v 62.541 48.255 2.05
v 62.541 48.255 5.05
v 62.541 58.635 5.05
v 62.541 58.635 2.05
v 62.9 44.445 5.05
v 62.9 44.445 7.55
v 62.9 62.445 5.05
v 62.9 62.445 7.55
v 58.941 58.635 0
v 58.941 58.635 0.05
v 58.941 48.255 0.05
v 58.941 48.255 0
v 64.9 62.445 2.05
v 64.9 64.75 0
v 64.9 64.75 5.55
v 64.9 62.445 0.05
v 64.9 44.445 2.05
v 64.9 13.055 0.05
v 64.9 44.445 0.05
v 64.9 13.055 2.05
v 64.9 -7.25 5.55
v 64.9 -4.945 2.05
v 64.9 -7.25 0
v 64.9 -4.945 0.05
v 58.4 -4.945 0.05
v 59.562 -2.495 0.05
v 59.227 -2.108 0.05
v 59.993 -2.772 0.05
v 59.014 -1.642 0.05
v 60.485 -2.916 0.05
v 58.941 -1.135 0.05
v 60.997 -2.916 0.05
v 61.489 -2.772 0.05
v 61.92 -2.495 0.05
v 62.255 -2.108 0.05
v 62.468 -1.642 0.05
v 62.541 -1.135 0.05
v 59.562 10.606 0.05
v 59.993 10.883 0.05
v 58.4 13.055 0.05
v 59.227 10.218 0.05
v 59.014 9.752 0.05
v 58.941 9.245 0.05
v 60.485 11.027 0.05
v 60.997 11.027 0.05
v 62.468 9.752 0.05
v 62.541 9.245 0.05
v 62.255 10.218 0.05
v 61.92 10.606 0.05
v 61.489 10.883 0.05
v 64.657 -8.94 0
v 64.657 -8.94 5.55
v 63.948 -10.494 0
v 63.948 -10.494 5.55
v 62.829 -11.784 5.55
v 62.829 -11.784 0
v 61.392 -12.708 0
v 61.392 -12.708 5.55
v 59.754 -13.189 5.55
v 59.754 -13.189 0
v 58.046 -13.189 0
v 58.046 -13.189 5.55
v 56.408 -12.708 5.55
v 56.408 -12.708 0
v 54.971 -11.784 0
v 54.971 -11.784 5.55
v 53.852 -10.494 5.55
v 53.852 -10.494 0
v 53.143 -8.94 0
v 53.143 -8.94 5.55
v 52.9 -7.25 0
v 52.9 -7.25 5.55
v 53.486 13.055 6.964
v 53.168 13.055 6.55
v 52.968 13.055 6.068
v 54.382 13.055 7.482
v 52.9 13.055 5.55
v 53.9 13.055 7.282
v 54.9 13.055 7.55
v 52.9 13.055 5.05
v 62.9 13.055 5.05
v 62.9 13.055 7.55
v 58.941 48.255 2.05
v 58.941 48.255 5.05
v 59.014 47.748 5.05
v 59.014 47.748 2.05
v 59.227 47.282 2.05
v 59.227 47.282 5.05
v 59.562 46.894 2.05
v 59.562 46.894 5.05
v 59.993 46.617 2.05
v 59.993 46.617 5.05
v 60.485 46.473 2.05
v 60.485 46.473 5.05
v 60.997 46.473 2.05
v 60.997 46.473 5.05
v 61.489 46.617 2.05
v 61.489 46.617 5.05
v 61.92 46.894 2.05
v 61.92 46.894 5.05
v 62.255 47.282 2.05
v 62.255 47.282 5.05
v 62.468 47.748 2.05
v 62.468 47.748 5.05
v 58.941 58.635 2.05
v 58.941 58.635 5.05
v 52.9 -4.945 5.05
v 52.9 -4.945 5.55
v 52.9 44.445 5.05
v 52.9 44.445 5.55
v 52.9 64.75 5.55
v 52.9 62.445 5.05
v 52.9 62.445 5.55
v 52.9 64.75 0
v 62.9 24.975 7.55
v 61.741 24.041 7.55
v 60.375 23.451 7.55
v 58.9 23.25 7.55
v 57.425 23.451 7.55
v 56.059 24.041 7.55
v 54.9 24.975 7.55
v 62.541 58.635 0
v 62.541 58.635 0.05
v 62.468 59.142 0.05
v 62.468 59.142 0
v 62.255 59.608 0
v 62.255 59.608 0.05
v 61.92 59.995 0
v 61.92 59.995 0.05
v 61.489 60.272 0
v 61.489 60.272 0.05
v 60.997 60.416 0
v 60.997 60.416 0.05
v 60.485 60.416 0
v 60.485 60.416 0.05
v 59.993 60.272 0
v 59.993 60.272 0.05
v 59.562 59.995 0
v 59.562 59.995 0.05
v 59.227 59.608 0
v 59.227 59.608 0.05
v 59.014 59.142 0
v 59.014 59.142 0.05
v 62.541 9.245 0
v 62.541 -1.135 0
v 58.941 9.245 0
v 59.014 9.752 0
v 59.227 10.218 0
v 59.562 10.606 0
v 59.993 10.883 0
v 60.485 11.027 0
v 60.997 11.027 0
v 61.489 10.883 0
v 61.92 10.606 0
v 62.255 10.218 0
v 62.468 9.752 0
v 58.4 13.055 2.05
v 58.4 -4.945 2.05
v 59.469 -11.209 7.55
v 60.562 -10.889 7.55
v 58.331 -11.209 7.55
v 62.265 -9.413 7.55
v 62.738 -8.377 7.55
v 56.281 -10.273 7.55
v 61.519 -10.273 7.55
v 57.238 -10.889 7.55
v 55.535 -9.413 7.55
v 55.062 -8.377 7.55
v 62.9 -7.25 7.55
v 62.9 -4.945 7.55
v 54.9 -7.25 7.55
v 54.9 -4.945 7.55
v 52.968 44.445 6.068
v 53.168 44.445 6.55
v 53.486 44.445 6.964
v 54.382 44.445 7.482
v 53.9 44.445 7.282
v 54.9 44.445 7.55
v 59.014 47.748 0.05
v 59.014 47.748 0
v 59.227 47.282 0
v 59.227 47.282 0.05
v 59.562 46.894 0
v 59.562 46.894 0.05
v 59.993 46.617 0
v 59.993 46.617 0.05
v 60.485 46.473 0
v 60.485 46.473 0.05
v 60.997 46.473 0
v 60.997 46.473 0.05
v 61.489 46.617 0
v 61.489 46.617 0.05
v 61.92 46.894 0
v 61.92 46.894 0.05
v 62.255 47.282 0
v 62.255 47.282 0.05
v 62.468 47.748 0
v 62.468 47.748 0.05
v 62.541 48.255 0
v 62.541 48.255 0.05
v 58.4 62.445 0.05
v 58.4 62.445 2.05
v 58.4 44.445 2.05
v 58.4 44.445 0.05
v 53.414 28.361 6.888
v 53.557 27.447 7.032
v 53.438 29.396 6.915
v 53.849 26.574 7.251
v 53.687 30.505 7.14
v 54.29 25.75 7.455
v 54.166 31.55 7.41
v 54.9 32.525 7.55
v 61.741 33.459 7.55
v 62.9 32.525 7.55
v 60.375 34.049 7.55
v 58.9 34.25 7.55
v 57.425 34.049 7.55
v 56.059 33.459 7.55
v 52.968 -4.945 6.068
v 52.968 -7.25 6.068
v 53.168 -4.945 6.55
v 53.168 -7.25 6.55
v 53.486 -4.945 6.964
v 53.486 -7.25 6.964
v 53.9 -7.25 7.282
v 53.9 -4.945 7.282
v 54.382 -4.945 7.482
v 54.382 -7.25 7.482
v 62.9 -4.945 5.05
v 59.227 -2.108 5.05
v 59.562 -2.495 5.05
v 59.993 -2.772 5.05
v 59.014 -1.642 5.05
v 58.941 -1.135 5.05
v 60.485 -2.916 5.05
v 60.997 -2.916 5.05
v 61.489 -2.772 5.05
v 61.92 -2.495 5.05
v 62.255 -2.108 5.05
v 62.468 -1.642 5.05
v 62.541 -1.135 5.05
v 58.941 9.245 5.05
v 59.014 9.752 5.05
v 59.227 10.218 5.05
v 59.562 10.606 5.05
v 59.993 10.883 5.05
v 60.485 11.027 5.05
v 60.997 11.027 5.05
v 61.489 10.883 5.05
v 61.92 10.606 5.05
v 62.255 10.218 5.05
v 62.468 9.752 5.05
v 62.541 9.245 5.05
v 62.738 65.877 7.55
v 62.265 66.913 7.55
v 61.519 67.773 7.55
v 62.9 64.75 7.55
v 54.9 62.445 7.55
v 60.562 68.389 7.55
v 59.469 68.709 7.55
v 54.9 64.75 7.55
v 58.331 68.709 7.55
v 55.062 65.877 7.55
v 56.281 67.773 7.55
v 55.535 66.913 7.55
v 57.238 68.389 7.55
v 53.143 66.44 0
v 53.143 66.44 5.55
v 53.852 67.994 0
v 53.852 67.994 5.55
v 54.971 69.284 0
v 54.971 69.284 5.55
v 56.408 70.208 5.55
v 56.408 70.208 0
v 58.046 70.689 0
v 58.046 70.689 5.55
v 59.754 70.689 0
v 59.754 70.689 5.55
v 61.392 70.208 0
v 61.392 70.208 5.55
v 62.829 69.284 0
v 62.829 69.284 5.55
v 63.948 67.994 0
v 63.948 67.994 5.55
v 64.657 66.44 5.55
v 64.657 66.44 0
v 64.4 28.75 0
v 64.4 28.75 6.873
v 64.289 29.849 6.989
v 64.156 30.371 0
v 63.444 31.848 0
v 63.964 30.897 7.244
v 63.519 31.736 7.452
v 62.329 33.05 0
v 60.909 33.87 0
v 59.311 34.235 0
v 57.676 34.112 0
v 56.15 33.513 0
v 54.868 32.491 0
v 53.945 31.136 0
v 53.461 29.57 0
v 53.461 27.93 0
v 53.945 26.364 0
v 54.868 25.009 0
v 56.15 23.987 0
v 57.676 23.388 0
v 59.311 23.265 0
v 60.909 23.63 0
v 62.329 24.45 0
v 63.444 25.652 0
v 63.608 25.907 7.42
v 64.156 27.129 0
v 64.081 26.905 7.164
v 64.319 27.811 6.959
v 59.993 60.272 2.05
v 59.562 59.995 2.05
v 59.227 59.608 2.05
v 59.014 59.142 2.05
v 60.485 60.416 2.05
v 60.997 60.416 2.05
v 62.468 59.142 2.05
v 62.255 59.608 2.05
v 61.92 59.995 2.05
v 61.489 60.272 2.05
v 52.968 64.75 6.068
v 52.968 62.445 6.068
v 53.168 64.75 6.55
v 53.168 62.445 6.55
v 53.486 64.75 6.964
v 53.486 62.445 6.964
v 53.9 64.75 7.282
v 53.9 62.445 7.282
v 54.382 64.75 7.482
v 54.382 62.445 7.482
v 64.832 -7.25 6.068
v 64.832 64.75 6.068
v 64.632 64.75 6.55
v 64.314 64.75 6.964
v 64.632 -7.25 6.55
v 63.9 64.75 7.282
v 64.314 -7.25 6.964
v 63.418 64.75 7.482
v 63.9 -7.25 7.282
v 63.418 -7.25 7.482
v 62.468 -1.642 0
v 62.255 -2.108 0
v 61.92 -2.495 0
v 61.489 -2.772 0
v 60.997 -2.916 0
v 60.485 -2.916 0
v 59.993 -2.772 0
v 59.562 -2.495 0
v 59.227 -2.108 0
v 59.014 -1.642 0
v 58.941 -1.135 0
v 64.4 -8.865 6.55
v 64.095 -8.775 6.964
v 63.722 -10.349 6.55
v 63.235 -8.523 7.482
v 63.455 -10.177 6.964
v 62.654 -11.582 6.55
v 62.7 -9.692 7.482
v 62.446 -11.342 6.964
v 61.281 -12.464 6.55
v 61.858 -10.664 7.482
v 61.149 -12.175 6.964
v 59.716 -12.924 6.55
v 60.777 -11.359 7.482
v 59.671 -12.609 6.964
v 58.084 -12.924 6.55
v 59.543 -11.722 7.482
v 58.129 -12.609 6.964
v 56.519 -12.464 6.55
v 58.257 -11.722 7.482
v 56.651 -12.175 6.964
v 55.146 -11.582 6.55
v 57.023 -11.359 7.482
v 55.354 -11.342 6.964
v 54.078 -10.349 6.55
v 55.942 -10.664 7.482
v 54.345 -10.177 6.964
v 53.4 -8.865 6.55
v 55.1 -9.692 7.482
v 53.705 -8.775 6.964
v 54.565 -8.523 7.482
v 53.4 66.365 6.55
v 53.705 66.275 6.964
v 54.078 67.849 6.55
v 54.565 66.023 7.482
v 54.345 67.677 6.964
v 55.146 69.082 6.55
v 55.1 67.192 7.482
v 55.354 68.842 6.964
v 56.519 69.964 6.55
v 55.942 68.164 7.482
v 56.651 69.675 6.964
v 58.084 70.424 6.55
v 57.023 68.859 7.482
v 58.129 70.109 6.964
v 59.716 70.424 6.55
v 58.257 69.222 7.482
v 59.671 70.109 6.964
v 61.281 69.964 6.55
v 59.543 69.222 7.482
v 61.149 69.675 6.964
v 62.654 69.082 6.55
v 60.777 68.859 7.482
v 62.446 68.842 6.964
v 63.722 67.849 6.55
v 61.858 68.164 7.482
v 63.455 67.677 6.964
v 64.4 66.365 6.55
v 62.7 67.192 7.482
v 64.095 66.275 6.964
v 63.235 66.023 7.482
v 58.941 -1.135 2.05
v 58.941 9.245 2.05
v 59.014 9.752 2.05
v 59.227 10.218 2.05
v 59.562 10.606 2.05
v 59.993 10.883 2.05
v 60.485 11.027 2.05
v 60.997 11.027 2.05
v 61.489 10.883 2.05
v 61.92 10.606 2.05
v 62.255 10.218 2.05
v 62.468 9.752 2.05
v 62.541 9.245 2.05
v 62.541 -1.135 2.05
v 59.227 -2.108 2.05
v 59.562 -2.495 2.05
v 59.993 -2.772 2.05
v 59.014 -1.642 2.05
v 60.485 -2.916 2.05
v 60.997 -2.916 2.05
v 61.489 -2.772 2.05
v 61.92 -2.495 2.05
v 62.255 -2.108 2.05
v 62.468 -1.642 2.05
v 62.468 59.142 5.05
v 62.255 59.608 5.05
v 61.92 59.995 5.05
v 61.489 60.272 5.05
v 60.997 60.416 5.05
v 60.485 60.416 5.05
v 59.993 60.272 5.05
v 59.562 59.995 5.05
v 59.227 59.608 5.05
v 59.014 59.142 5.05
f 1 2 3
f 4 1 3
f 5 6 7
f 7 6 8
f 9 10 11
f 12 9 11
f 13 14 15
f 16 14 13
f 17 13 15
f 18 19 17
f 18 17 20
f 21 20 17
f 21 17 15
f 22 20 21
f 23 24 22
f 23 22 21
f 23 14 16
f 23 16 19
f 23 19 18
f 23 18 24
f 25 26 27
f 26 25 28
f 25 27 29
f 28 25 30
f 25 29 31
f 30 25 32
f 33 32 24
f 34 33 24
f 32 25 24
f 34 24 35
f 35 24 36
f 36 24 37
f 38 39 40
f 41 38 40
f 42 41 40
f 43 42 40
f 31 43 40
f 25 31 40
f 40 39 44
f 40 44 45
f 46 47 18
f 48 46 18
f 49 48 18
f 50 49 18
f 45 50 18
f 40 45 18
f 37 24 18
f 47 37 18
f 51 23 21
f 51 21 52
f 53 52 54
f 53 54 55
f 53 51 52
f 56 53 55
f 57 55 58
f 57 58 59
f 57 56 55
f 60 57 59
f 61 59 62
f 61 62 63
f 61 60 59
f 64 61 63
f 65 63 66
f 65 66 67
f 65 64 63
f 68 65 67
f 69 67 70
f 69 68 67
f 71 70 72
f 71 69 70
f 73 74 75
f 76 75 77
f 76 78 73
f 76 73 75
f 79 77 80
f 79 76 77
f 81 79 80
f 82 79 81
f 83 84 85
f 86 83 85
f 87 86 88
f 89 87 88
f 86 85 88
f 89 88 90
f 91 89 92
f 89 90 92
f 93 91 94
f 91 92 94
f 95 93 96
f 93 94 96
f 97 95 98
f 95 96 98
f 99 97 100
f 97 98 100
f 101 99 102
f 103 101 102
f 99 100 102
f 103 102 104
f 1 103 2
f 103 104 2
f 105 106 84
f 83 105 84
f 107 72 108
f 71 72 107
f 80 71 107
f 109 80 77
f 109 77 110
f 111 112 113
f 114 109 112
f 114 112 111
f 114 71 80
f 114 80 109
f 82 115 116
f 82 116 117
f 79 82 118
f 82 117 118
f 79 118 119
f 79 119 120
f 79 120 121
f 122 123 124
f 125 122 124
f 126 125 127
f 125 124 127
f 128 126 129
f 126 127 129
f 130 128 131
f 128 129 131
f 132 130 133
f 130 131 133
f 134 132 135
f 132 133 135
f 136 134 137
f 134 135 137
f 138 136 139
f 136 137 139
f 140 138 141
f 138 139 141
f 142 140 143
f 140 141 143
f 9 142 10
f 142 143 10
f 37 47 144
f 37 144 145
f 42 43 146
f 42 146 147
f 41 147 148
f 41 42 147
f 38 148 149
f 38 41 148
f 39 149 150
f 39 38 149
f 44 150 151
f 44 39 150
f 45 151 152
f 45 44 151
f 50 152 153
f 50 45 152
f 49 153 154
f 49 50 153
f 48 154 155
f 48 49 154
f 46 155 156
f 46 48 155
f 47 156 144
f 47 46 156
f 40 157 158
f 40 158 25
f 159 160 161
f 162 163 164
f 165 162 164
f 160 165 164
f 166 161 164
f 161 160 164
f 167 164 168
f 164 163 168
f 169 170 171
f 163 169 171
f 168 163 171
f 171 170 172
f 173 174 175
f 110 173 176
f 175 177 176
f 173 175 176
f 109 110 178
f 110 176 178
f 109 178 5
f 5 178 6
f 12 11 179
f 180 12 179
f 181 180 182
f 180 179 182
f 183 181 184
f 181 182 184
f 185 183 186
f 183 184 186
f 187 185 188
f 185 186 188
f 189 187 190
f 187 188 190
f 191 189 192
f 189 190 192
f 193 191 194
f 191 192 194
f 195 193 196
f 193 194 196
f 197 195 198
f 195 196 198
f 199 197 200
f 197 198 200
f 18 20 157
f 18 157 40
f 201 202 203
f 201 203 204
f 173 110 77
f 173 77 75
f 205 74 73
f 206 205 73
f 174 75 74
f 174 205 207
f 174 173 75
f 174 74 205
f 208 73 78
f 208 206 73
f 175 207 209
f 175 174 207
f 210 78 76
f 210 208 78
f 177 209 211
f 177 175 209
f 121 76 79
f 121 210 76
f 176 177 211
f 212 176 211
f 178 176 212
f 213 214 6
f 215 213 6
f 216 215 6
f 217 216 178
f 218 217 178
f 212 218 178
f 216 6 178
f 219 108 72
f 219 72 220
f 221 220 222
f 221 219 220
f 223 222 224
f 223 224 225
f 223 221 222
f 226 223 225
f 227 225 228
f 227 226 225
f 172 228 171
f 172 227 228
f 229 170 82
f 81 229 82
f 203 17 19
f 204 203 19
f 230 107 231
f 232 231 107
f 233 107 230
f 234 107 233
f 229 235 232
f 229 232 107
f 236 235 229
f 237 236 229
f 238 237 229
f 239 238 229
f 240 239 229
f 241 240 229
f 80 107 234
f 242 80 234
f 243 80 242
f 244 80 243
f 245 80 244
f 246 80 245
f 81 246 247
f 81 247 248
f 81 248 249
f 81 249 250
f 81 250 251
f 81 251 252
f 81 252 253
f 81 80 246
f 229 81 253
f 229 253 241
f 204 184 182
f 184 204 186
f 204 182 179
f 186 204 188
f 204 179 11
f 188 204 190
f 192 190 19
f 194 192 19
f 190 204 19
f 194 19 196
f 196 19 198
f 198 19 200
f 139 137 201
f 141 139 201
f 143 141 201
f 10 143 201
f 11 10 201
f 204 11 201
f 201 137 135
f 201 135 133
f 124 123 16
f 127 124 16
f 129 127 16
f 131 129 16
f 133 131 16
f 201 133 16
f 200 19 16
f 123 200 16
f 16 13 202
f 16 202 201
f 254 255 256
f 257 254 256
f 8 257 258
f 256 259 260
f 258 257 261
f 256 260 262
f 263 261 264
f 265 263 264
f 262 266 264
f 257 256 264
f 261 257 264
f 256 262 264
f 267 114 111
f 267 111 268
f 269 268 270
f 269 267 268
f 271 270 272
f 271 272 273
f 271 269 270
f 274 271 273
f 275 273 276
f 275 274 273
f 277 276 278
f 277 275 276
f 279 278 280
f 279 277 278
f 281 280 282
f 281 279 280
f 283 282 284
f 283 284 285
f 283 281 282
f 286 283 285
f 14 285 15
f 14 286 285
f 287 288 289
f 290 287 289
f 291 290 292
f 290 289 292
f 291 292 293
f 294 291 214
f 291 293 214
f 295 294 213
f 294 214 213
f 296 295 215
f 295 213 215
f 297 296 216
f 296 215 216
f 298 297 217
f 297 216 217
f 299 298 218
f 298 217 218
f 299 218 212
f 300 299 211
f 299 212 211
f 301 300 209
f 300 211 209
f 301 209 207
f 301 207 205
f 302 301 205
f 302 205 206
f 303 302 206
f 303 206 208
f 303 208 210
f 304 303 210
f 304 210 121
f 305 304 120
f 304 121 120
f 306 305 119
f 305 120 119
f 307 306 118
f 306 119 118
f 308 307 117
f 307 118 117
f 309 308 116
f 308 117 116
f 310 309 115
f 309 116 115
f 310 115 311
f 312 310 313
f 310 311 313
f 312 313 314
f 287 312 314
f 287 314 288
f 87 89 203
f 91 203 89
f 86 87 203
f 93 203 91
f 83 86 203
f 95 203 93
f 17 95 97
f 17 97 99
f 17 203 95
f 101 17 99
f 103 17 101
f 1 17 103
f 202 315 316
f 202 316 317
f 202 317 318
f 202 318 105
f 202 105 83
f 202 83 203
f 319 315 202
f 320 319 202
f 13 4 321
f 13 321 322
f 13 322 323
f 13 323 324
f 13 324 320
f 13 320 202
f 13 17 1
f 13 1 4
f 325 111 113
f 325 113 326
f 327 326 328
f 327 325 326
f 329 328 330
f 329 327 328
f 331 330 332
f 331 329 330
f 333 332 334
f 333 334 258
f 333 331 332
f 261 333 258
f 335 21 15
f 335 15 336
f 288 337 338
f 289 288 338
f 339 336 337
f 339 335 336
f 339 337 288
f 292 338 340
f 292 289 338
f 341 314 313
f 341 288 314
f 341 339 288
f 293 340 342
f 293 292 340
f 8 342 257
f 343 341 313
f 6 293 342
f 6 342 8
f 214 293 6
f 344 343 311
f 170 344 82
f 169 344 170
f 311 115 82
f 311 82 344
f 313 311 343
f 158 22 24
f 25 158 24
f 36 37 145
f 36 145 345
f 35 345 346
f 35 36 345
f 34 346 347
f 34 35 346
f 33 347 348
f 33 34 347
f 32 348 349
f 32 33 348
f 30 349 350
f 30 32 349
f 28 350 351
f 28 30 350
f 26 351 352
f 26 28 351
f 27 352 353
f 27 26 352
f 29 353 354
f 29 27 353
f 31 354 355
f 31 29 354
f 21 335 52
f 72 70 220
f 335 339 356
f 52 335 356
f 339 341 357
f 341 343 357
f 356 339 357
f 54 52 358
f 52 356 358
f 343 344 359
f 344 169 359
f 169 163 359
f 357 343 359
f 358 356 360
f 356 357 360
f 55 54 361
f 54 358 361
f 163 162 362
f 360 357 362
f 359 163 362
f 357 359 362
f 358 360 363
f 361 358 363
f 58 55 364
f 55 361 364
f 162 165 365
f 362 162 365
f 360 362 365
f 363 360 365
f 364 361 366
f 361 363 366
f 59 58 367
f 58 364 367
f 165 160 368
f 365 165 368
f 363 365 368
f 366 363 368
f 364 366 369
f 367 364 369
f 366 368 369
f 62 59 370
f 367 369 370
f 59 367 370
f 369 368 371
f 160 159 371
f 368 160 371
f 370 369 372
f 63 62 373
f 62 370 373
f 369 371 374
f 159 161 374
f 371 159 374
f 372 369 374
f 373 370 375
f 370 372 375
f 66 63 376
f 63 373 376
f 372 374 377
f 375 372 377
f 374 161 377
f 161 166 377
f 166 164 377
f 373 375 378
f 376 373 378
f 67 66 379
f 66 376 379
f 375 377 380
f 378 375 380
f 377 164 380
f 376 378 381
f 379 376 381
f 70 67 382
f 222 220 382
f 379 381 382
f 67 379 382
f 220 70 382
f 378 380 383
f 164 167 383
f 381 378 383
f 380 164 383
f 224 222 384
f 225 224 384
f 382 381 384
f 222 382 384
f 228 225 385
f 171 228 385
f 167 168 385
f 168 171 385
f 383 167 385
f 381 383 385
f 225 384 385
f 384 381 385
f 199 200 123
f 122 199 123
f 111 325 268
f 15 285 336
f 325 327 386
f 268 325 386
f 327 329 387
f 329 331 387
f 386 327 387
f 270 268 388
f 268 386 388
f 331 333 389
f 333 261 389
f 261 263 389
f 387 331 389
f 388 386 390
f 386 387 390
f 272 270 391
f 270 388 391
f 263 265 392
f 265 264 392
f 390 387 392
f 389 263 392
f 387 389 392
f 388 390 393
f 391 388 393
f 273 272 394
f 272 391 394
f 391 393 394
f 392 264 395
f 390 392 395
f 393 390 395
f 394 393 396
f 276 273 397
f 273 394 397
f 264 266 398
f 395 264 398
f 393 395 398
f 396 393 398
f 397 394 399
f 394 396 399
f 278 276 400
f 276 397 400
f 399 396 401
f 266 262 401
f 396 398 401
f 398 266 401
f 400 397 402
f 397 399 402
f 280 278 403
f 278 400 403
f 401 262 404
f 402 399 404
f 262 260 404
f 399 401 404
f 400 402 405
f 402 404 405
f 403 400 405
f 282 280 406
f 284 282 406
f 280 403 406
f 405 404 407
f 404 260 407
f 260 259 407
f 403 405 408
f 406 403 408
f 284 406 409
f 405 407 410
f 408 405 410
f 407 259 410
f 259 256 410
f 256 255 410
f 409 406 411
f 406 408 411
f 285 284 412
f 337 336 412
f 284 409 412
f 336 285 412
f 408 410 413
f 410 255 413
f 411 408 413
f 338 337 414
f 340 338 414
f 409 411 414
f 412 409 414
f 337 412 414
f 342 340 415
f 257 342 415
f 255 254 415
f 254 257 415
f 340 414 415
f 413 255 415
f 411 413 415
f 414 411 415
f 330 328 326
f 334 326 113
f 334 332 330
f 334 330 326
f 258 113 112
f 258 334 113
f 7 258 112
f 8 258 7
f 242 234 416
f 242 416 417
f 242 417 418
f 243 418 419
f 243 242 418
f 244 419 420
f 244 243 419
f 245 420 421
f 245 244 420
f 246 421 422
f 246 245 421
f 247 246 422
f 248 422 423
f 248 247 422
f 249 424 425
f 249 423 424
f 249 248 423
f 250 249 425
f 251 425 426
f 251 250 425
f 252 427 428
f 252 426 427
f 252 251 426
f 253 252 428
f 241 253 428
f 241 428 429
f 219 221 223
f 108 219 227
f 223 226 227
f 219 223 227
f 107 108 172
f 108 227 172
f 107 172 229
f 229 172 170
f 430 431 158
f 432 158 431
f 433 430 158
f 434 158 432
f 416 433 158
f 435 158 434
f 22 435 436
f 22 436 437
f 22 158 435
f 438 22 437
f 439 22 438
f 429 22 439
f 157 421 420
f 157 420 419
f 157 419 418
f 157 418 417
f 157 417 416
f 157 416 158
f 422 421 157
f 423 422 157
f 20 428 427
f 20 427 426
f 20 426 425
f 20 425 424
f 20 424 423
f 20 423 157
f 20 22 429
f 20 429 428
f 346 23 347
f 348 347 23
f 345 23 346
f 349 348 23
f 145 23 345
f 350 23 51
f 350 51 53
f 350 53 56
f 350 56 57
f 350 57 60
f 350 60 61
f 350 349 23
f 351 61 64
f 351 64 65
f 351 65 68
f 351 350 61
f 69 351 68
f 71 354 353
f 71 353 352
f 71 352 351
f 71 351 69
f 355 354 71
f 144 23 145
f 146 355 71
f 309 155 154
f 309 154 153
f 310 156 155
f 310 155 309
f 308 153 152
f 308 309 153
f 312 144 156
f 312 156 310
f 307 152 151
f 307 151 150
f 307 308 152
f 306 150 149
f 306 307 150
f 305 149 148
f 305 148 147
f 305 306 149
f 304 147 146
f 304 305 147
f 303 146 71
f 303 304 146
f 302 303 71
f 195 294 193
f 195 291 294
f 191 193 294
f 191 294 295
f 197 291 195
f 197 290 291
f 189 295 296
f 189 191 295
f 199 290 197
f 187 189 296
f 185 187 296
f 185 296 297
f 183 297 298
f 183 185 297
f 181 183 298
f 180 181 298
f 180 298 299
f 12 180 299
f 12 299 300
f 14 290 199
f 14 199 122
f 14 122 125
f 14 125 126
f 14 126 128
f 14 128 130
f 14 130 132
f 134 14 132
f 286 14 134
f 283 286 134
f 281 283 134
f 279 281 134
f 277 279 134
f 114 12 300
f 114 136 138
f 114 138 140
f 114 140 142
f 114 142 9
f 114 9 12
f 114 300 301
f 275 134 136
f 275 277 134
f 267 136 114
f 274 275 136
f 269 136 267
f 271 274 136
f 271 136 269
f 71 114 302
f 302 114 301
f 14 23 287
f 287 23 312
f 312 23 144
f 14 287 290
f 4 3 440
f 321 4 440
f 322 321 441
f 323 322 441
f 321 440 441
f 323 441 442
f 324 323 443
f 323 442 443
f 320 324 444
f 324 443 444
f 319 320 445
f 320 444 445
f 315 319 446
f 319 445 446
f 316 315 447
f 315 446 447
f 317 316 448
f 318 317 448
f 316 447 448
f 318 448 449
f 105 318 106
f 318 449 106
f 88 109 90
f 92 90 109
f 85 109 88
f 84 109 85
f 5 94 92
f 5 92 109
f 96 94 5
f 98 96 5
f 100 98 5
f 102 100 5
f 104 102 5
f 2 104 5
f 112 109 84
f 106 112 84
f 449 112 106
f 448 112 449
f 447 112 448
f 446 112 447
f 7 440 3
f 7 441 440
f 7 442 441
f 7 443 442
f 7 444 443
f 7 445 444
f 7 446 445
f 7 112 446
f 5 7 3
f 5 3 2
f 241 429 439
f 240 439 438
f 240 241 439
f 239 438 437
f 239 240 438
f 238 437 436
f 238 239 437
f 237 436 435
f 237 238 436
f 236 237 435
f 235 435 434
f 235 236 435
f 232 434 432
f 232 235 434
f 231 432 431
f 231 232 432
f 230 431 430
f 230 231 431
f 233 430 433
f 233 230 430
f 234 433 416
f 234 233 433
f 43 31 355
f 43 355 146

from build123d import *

# Parameters (mm, degrees)
SALIENTE_EXTRUIR1_DEPTH = 7.55
REDONDEO1_R             = 2
CROQUIS2_W              = 16.065204313
CROQUIS2_H              = 18
CORTAR_EXTRUIR1_DEPTH   = 2.5
CROQUIS3_R              = 5.5
CORTAR_EXTRUIR2_DEPTH   = 97.304594979
CROQUIS4_W              = 2
CROQUIS4_H              = 18
CORTAR_EXTRUIR3_DEPTH   = 6.5
CORTAR_EXTRUIR4_DEPTH   = 97.140912353


with BuildPart() as part:
    # Croquis1 → Saliente-Extruir1 (new body)
    with BuildSketch(Plane.XY):
        with BuildLine():
            Line((52.9, -7.25), (52.9, 64.75))
            ThreePointArc((52.9, 64.75), (58.9, 70.75), (64.9, 64.75))
            Line((64.9, 64.75), (64.9, -7.25))
            ThreePointArc((64.9, -7.25), (58.9, -13.25), (52.9, -7.25))
        make_face()
    extrude(amount=SALIENTE_EXTRUIR1_DEPTH)

    # Redondeo1
    redondeo1_edges = [part.edges().sort_by_distance(p)[0] for p in [
        (58.9, 70.75, 7.55),
        (64.9, 28.75, 7.55),
        (58.9, -13.25, 7.55),
        (52.9, 28.75, 7.55),
    ]]
    fillet(redondeo1_edges, radius=REDONDEO1_R)

    # Croquis2 → Cortar-Extruir1 (cut)
    with BuildSketch(Plane.XY.offset(7.55)):
        with Locations((54.867397844, 4.055228902)):
            Rectangle(CROQUIS2_W, CROQUIS2_H)
        with Locations((54.867397844, 53.444771098)):
            Rectangle(CROQUIS2_W, CROQUIS2_H)
    extrude(amount=-CORTAR_EXTRUIR1_DEPTH, mode=Mode.SUBTRACT)

    # Croquis3 → Cortar-Extruir2 (cut, through all)
    with BuildSketch(Plane.XY.offset(7.55)):
        with Locations((58.9, 28.75)):
            Circle(CROQUIS3_R)
    extrude(amount=-CORTAR_EXTRUIR2_DEPTH, mode=Mode.SUBTRACT)

    # Croquis4 → Cortar-Extruir3 (cut)
    with BuildSketch(Plane(origin=(64.9, 0, 0), x_dir=(0, 0, -1), z_dir=(1, 0, 0))):
        with Locations((-1.05, 4.055228902)):
            Rectangle(CROQUIS4_W, CROQUIS4_H)
        with Locations((-1.05, 53.444771098)):
            Rectangle(CROQUIS4_W, CROQUIS4_H)
    extrude(amount=-CORTAR_EXTRUIR3_DEPTH, mode=Mode.SUBTRACT)

    # Croquis5 → Cortar-Extruir4 (cut, through all)
    with BuildSketch(Plane.XY.offset(5.05)):
        with BuildLine():
            Line((62.541, 9.245228902), (62.541, -1.134771098))
            ThreePointArc((62.541, -1.134771098), (60.741, -2.934771098), (58.941, -1.134771098))
            Line((58.941, -1.134771098), (58.941, 9.245228902))
            ThreePointArc((58.941, 9.245228902), (60.741, 11.045228902), (62.541, 9.245228902))
        make_face()
        with BuildLine():
            Line((62.541, 48.254771098), (62.541, 58.634771098))
            ThreePointArc((62.541, 58.634771098), (60.741, 60.434771098), (58.941, 58.634771098))
            Line((58.941, 58.634771098), (58.941, 48.254771098))
            ThreePointArc((58.941, 48.254771098), (60.741, 46.454771098), (62.541, 48.254771098))
        make_face()
    extrude(amount=-CORTAR_EXTRUIR4_DEPTH, mode=Mode.SUBTRACT)


solid = part.part
